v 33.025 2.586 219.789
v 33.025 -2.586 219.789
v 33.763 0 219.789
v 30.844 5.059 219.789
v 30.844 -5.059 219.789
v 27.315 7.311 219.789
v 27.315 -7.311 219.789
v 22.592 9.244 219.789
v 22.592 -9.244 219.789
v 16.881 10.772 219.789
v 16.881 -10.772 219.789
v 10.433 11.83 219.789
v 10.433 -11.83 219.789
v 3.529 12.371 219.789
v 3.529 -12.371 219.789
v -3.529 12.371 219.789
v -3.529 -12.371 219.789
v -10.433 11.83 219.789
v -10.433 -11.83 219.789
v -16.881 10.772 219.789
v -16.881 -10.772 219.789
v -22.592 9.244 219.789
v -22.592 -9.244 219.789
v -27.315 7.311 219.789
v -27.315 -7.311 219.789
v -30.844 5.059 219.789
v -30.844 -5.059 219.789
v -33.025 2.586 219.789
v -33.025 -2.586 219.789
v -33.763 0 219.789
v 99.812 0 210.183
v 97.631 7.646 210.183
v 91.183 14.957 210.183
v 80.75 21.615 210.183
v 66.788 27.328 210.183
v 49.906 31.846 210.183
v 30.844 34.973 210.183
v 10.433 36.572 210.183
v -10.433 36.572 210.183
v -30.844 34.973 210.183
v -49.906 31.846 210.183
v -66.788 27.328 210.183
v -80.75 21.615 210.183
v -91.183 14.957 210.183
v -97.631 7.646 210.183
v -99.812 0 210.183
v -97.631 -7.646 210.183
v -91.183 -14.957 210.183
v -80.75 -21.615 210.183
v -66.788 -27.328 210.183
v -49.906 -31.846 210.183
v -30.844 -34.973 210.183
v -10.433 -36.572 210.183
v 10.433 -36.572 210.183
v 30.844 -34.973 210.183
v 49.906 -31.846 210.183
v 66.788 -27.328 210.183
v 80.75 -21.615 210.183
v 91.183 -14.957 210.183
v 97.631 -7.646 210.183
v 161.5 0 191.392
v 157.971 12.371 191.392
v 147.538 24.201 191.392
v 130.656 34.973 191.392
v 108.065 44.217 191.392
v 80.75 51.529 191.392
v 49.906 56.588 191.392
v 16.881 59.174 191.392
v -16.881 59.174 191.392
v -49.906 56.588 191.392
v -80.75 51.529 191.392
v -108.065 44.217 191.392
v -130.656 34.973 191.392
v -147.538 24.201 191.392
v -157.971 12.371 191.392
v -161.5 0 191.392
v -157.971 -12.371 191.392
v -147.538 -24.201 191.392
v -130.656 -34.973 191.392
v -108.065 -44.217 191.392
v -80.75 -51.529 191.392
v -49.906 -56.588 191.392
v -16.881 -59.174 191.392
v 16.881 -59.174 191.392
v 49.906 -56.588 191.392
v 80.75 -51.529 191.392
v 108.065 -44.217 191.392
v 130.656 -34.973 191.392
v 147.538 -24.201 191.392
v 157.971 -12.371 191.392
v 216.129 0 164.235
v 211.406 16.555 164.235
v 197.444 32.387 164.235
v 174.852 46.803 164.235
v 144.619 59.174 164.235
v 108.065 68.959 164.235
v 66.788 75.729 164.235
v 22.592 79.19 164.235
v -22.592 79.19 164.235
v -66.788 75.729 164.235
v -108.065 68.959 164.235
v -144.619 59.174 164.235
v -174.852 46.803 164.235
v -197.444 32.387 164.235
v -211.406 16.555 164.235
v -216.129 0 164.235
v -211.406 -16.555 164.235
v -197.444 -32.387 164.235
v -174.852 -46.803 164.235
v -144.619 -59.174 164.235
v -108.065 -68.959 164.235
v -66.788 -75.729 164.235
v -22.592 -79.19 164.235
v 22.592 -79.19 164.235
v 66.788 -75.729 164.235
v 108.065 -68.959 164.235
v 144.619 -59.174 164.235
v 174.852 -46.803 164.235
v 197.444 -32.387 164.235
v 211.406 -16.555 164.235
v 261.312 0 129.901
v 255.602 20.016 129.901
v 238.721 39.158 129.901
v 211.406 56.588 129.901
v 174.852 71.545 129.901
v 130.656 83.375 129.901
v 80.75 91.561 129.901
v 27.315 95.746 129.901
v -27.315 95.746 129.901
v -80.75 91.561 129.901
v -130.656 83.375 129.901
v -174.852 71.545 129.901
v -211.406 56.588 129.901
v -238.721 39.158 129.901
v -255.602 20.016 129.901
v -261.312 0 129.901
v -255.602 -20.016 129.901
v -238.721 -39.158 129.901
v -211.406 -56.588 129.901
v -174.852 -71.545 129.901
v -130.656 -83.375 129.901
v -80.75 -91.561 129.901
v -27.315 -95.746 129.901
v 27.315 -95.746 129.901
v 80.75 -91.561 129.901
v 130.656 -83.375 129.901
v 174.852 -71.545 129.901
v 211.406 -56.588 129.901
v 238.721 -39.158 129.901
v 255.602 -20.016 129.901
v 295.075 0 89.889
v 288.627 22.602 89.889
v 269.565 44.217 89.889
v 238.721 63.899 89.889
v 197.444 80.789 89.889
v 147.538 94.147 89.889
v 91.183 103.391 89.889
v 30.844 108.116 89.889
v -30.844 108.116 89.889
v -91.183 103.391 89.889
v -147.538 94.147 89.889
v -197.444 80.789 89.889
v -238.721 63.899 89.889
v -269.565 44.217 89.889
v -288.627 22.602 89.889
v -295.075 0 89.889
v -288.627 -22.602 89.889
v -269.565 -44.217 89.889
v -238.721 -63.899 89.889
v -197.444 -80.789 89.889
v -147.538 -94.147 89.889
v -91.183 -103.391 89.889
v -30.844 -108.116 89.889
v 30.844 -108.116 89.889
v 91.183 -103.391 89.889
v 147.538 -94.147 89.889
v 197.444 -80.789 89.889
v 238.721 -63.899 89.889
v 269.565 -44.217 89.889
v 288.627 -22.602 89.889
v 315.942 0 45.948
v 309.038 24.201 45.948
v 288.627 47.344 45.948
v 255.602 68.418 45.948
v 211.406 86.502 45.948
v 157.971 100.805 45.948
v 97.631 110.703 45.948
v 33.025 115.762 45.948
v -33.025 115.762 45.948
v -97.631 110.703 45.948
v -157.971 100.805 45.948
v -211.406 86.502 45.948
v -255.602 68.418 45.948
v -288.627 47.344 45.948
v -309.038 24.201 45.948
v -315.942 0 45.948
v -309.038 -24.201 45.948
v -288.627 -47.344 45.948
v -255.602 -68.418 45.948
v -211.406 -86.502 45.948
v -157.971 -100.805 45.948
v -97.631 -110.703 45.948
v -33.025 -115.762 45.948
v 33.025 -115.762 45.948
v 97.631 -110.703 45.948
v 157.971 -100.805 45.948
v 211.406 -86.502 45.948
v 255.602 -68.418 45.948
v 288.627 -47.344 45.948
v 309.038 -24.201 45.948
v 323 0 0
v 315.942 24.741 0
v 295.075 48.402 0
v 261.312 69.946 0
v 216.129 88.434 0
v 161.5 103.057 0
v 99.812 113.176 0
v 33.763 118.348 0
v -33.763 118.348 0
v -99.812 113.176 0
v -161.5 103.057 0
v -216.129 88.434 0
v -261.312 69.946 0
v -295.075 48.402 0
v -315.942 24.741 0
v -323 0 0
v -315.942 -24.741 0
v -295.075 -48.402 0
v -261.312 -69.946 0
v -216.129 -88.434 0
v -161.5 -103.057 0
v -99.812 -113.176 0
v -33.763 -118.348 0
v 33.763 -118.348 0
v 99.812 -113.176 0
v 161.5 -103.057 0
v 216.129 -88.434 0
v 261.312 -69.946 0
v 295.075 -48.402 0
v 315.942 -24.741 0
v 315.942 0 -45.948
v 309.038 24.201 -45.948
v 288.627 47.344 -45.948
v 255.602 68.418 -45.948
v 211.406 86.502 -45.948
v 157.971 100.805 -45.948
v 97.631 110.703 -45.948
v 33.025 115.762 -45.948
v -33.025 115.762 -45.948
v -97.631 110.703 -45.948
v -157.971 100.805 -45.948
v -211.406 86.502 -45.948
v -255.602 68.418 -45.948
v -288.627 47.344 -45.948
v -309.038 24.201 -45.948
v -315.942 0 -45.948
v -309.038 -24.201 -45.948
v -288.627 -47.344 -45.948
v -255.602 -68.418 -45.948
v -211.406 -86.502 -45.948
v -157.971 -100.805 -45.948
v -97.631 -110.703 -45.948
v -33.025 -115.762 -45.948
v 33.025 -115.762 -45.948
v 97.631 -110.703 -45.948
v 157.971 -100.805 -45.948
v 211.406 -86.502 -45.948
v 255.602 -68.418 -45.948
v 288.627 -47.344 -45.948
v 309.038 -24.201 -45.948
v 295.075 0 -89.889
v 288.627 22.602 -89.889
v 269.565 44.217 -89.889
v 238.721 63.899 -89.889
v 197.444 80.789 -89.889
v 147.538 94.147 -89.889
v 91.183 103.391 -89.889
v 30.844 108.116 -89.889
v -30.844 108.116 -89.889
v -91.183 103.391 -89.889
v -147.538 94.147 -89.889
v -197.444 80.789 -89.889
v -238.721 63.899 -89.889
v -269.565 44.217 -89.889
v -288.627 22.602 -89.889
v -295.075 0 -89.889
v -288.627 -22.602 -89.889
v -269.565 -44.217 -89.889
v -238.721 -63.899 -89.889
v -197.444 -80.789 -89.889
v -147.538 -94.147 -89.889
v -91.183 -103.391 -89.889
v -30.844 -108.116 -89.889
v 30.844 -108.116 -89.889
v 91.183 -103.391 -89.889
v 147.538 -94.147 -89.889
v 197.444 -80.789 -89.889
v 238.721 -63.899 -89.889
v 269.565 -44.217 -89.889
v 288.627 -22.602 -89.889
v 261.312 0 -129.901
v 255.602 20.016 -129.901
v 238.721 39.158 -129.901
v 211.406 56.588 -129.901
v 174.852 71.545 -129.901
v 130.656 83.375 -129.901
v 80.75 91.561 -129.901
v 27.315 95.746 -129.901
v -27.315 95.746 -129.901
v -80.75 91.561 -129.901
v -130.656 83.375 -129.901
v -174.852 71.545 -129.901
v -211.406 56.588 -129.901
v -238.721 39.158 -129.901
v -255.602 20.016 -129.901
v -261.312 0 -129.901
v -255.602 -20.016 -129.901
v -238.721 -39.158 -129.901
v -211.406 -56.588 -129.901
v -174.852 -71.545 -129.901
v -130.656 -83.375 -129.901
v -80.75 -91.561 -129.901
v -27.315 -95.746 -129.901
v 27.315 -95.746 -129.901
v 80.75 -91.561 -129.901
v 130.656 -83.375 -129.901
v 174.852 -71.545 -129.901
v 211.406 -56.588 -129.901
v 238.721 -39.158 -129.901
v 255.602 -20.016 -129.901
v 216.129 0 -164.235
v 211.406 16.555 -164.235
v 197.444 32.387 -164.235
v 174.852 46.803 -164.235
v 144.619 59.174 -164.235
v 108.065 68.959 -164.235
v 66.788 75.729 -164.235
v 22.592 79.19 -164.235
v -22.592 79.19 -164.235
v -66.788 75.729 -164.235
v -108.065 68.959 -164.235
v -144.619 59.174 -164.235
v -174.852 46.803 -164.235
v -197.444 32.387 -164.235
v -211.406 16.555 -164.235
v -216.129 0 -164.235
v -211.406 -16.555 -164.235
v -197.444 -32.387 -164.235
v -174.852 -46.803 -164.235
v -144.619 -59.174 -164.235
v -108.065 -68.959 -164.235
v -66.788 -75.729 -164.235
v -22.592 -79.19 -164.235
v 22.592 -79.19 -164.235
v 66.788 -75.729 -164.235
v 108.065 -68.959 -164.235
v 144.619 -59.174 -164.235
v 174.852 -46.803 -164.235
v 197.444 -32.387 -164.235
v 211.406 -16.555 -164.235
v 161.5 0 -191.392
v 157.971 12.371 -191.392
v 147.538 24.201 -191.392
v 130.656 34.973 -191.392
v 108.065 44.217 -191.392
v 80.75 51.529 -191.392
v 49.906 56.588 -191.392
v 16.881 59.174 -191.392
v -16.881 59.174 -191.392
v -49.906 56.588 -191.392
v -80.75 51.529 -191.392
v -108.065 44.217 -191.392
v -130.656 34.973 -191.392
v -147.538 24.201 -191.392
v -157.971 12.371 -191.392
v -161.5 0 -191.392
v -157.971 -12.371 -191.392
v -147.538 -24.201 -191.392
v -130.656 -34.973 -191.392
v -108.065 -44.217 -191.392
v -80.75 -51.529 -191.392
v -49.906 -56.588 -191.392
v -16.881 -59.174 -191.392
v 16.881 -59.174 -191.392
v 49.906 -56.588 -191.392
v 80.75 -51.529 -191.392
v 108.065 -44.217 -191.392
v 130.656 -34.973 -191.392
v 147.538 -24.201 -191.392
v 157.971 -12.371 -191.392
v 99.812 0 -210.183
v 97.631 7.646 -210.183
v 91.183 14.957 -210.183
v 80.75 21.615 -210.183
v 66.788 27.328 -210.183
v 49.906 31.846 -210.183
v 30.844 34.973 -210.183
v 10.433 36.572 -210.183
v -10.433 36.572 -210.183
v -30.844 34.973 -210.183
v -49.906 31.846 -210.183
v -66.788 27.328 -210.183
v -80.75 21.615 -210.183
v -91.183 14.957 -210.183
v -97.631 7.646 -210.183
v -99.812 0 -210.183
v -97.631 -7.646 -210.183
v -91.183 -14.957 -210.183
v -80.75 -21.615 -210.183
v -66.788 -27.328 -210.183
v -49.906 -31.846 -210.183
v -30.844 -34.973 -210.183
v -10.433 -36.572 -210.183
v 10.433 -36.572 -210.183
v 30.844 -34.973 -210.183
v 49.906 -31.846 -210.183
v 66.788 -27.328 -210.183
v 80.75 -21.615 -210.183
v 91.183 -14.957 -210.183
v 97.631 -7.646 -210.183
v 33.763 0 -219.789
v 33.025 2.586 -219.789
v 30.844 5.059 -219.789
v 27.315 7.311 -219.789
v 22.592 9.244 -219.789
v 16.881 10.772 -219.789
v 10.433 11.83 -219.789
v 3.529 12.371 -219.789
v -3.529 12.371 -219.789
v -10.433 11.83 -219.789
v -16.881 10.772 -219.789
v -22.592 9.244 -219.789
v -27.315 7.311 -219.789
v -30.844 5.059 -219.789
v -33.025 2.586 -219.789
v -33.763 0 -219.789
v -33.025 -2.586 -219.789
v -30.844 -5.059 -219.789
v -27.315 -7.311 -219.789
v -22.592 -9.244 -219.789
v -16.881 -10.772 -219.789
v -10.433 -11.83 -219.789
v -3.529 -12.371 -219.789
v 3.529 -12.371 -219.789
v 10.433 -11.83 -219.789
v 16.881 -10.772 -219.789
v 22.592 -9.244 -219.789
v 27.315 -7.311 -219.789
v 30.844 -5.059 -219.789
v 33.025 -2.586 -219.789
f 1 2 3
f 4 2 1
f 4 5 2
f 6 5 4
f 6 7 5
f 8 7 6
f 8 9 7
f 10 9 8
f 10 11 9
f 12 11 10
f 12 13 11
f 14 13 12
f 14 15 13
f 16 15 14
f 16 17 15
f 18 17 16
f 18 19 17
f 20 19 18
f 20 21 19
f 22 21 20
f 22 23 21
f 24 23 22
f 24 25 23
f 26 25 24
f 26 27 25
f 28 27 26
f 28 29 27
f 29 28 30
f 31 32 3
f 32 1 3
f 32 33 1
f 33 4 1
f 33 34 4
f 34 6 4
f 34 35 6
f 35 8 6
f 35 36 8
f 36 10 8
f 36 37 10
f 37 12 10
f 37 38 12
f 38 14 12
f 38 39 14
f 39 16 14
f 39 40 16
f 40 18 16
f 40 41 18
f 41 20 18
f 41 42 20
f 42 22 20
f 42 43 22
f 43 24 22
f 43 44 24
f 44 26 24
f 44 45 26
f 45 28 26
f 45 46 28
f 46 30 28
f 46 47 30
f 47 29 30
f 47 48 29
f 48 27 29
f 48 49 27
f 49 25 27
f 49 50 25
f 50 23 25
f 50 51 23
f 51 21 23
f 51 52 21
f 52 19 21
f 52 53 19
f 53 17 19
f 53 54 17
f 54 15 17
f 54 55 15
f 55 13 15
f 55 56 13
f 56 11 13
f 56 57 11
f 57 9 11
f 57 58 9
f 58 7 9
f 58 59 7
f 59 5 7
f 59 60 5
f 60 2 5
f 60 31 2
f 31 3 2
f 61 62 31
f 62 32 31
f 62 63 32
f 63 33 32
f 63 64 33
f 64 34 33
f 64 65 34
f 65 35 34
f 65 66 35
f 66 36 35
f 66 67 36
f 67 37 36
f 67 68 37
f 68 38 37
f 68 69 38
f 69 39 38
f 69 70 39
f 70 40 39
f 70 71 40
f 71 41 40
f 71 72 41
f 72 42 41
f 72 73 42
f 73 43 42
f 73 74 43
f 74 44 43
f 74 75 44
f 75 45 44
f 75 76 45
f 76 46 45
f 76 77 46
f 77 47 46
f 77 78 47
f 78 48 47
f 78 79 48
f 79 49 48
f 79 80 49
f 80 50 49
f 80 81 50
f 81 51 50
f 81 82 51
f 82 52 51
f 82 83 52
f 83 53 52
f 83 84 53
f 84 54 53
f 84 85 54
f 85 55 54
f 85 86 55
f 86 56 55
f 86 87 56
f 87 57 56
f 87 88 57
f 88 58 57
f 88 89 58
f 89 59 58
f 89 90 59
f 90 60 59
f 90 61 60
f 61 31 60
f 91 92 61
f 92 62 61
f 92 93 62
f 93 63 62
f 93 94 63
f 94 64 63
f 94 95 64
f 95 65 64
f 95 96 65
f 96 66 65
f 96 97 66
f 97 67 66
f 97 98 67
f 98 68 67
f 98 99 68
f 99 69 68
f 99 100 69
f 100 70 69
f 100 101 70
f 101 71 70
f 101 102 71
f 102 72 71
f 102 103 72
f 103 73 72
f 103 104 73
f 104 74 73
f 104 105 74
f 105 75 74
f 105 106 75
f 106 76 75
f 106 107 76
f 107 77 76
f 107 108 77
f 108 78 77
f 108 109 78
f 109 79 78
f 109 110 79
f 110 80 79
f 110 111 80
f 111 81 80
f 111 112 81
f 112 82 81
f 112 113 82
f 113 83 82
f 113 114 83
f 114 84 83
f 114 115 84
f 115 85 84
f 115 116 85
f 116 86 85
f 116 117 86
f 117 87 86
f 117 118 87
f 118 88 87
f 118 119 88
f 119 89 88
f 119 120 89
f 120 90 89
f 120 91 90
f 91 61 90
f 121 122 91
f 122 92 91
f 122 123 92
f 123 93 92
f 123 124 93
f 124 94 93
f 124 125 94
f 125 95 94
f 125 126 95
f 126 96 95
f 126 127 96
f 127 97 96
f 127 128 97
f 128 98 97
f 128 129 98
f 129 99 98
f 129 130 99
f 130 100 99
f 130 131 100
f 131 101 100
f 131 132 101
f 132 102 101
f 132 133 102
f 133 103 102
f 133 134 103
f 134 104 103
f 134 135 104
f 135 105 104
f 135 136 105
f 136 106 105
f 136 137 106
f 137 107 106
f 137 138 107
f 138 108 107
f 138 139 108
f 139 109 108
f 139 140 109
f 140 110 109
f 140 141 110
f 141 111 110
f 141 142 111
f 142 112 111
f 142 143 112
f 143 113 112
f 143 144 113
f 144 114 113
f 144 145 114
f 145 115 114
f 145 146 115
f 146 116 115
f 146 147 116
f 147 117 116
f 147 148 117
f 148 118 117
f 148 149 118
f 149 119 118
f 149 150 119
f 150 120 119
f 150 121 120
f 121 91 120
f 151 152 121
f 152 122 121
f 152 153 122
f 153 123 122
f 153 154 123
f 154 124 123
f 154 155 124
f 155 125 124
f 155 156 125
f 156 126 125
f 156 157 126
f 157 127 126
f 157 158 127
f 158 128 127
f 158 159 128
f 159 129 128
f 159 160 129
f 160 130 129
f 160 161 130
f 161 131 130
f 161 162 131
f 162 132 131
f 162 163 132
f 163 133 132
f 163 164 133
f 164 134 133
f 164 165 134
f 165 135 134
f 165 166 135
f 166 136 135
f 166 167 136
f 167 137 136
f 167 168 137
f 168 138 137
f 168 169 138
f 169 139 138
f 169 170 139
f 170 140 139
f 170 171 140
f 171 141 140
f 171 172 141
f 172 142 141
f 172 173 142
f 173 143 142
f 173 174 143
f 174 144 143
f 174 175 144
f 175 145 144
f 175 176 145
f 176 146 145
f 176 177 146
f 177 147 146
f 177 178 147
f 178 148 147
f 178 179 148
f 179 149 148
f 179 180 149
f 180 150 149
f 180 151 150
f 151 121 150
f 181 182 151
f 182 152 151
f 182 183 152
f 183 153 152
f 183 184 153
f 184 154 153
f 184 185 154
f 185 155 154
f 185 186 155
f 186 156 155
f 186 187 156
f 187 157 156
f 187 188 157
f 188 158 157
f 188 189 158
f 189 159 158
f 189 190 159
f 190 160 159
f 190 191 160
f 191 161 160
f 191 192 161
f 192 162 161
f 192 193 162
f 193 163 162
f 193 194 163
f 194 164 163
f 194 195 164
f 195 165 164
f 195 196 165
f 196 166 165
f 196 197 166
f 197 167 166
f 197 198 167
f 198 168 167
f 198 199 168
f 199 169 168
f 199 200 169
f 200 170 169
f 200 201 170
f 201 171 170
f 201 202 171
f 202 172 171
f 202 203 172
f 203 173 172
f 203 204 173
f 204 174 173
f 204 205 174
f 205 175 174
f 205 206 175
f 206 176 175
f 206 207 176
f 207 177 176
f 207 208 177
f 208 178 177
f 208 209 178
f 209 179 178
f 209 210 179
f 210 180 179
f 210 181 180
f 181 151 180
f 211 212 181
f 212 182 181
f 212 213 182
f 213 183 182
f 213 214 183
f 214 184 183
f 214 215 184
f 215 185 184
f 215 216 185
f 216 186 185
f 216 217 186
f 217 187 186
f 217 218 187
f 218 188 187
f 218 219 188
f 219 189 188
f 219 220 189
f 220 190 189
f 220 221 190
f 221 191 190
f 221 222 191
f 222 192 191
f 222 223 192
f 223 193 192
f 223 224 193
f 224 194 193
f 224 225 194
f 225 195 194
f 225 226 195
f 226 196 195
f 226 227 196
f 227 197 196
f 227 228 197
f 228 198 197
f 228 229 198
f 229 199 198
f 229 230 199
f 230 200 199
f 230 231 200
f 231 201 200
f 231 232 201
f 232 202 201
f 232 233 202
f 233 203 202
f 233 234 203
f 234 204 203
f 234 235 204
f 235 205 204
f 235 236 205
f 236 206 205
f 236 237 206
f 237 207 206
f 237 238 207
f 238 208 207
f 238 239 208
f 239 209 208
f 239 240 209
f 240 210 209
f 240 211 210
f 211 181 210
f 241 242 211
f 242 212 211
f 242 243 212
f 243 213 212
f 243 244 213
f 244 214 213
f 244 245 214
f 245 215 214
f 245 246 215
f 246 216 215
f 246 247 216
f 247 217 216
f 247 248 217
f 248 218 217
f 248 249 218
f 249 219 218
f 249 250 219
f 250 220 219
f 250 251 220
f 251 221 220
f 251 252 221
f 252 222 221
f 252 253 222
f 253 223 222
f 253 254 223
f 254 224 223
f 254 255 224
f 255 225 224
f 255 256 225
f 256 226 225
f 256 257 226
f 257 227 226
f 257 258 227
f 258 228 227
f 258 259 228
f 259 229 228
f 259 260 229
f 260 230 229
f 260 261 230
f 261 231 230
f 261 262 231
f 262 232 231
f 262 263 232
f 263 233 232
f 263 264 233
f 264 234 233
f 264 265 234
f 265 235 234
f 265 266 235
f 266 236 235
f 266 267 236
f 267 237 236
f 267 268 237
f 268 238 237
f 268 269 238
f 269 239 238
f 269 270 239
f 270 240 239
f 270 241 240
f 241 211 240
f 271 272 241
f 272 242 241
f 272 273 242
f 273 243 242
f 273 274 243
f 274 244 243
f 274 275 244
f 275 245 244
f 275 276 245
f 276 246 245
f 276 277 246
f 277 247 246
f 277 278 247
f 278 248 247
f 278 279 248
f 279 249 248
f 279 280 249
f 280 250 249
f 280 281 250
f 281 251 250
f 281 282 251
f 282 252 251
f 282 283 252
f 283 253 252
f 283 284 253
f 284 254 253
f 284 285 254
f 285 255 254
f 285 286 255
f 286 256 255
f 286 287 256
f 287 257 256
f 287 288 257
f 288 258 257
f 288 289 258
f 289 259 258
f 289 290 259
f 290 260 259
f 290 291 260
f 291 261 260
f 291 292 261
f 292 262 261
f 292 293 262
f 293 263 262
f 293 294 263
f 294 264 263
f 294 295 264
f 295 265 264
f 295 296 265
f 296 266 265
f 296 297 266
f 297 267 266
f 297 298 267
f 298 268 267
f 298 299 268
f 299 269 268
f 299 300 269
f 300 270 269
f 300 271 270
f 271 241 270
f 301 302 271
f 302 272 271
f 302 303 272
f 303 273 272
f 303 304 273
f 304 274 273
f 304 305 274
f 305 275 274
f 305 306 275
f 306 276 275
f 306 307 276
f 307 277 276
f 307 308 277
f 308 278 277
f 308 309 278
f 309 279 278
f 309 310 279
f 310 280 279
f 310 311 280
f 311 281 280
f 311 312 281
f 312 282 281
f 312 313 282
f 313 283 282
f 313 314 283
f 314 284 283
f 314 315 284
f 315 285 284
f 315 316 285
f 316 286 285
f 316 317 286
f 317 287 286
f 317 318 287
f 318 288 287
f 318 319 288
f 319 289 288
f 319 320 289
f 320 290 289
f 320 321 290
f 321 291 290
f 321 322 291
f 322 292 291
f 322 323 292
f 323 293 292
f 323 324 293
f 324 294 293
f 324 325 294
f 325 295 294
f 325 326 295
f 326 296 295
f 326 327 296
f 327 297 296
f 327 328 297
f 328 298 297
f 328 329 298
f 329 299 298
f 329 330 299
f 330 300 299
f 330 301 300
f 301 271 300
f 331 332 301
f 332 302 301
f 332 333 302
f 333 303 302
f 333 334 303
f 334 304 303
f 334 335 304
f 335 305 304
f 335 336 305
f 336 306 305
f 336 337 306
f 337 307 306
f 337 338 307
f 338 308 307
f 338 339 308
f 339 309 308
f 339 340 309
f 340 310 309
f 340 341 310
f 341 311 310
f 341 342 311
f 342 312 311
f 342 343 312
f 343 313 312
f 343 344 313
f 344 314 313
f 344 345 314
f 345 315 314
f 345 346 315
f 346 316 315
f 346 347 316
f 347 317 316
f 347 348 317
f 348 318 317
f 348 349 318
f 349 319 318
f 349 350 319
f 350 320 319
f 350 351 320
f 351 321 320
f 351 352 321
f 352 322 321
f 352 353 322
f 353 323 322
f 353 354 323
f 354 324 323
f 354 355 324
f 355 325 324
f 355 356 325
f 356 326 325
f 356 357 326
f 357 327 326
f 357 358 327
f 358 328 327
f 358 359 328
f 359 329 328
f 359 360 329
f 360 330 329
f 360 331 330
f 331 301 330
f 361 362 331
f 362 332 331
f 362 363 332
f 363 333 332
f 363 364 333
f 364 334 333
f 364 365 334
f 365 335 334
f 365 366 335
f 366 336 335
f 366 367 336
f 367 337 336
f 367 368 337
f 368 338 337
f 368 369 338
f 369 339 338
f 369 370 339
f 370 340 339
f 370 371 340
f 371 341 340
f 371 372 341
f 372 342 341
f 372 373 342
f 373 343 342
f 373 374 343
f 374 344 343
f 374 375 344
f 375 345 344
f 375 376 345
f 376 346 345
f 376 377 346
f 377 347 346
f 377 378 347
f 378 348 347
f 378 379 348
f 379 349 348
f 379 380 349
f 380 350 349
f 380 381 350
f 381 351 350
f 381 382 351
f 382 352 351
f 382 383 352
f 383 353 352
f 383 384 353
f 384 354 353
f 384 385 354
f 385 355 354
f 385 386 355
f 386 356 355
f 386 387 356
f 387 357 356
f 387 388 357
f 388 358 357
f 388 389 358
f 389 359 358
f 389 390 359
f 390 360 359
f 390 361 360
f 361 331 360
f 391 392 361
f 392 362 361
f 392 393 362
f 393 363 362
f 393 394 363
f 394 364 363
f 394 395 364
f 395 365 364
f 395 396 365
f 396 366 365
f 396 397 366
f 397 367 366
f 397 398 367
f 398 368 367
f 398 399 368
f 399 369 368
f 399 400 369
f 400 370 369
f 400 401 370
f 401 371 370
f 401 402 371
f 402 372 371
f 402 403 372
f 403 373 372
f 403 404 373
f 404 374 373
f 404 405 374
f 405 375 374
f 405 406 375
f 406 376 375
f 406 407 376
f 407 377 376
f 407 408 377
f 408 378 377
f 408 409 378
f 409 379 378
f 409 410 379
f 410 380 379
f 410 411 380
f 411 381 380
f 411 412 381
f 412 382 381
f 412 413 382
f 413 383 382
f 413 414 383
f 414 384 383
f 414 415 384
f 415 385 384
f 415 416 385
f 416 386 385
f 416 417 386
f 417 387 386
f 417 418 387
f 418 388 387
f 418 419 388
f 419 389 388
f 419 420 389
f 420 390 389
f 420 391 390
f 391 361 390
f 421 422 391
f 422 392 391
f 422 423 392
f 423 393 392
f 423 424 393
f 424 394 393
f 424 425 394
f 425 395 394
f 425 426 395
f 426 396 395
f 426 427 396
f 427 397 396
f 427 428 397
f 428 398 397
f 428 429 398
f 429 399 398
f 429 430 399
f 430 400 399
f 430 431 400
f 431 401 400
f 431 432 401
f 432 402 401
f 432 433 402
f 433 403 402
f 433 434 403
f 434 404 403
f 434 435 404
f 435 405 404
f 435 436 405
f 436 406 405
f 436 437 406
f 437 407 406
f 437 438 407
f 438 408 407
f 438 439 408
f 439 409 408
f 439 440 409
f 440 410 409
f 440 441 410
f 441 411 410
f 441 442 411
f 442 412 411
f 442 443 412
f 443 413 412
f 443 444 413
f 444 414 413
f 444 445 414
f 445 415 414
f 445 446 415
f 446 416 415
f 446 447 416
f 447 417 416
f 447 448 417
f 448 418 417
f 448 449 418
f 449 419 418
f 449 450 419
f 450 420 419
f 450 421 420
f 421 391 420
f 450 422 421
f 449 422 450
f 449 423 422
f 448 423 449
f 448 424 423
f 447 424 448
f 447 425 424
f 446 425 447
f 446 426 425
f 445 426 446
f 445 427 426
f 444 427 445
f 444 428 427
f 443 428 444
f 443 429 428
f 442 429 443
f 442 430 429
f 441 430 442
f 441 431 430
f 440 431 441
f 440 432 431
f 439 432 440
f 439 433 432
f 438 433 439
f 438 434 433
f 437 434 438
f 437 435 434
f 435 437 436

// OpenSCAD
// Generated by SolidPython 1.0.1 on 2020-07-29 00:46:53


scale(v = [19, 7, 13]) {
	sphere(r = 17);
}
/***********************************************
*********      SolidPython code:      **********
************************************************
 
# import packages: SolidPython
from solid import *
from solid.utils import *
from itertools import chain, combinations, permutations


class Resize:

    def __init__(self, scad_file):
        self.scad_file = scad_file
        #self.scad_file = import_scad(scad_file)
        # cone/cylinder param:
        self.r1 = 0
        self.r2 = 0
        self.h = 0
        # rectangular prism param:
        self.w = 0
        self.l = 0
        # ellipse param:
        self.r = 0

    # import OpenScad code (file name corresponds to shape)


    # classify shape + parameters
    def assign(self, param1, param2, param3):
        if self.scad_file == 'cone.scad':
            self.r1 = param1
            self.r2 = param2
            self.h = param3
        elif self.scad_file == 'cylinder.scad':
            self.r1 = param1
            self.r2 = param2
            self.h = param3
        elif self.scad_file == 'rectangularPrism.scad':
            self.h = param1
            self.l = param2
            self.w = param3
        else:
            self.r = param1
            self.h = param2

    # resize parameters
    def iterate(self):
        x = range(3, 20, 2)
        i = 1
        if self.scad_file == 'cone.scad':
            tempList = list(permutations(x, 2))
            for temp in tempList:
                param1 = temp[0]
                param2 = temp[1]
                filepath = 'produced_scad_files/' + 'cone' + str(param1) + '_' + str(param2) + '_' + '.scad'
                scad_render_to_file(cylinder(h=param1, r1=param2, r2=0), filepath)

        elif self.scad_file == 'cylinder.scad':
            tempList = list(permutations(x, 3))
            for temp in tempList:
                param1 = temp[0]
                param2 = temp[1]
                filepath = 'produced_scad_files/' + 'cylinder' + str(param1) + '_' + str(param2) + '_' + '.scad'
                scad_render_to_file(cylinder(h=param1, r1=param2, r2=param2), filepath)

        elif self.scad_file == 'rectangularPrism.scad':
            tempList = list(permutations(x, 3))
            for temp in tempList:
                param1 = temp[0]
                param2 = temp[1]
                param3 = temp[2]
                filepath = 'produced_scad_files/' + 'rectangularPrism' + str(param1) + '_' + str(param2) + '_' + str(
                    param3) + '.scad'
                scad_render_to_file(cube(size=(param1, param2, param3)), filepath)

        elif self.scad_file == 'ellipse.scad':
            tempList = list(permutations(x, 4))
            for temp in tempList:
                param1 = temp[0]
                param2 = temp[1]
                param3 = temp[2]
                param4 = temp[3]
                filepath = 'produced_scad_files/' + 'ellipse' + str(param1) + '_' + str(param2) + '_' + str(param3) + '_' + str(param4) + '.scad'
                scad_render_to_file(scale([param1, param2, param3])(sphere(r=param4)), filepath)

    def render_to_scadfile(self):
        scad_render_to_file(scad, 'example.scad') 
 
************************************************/
